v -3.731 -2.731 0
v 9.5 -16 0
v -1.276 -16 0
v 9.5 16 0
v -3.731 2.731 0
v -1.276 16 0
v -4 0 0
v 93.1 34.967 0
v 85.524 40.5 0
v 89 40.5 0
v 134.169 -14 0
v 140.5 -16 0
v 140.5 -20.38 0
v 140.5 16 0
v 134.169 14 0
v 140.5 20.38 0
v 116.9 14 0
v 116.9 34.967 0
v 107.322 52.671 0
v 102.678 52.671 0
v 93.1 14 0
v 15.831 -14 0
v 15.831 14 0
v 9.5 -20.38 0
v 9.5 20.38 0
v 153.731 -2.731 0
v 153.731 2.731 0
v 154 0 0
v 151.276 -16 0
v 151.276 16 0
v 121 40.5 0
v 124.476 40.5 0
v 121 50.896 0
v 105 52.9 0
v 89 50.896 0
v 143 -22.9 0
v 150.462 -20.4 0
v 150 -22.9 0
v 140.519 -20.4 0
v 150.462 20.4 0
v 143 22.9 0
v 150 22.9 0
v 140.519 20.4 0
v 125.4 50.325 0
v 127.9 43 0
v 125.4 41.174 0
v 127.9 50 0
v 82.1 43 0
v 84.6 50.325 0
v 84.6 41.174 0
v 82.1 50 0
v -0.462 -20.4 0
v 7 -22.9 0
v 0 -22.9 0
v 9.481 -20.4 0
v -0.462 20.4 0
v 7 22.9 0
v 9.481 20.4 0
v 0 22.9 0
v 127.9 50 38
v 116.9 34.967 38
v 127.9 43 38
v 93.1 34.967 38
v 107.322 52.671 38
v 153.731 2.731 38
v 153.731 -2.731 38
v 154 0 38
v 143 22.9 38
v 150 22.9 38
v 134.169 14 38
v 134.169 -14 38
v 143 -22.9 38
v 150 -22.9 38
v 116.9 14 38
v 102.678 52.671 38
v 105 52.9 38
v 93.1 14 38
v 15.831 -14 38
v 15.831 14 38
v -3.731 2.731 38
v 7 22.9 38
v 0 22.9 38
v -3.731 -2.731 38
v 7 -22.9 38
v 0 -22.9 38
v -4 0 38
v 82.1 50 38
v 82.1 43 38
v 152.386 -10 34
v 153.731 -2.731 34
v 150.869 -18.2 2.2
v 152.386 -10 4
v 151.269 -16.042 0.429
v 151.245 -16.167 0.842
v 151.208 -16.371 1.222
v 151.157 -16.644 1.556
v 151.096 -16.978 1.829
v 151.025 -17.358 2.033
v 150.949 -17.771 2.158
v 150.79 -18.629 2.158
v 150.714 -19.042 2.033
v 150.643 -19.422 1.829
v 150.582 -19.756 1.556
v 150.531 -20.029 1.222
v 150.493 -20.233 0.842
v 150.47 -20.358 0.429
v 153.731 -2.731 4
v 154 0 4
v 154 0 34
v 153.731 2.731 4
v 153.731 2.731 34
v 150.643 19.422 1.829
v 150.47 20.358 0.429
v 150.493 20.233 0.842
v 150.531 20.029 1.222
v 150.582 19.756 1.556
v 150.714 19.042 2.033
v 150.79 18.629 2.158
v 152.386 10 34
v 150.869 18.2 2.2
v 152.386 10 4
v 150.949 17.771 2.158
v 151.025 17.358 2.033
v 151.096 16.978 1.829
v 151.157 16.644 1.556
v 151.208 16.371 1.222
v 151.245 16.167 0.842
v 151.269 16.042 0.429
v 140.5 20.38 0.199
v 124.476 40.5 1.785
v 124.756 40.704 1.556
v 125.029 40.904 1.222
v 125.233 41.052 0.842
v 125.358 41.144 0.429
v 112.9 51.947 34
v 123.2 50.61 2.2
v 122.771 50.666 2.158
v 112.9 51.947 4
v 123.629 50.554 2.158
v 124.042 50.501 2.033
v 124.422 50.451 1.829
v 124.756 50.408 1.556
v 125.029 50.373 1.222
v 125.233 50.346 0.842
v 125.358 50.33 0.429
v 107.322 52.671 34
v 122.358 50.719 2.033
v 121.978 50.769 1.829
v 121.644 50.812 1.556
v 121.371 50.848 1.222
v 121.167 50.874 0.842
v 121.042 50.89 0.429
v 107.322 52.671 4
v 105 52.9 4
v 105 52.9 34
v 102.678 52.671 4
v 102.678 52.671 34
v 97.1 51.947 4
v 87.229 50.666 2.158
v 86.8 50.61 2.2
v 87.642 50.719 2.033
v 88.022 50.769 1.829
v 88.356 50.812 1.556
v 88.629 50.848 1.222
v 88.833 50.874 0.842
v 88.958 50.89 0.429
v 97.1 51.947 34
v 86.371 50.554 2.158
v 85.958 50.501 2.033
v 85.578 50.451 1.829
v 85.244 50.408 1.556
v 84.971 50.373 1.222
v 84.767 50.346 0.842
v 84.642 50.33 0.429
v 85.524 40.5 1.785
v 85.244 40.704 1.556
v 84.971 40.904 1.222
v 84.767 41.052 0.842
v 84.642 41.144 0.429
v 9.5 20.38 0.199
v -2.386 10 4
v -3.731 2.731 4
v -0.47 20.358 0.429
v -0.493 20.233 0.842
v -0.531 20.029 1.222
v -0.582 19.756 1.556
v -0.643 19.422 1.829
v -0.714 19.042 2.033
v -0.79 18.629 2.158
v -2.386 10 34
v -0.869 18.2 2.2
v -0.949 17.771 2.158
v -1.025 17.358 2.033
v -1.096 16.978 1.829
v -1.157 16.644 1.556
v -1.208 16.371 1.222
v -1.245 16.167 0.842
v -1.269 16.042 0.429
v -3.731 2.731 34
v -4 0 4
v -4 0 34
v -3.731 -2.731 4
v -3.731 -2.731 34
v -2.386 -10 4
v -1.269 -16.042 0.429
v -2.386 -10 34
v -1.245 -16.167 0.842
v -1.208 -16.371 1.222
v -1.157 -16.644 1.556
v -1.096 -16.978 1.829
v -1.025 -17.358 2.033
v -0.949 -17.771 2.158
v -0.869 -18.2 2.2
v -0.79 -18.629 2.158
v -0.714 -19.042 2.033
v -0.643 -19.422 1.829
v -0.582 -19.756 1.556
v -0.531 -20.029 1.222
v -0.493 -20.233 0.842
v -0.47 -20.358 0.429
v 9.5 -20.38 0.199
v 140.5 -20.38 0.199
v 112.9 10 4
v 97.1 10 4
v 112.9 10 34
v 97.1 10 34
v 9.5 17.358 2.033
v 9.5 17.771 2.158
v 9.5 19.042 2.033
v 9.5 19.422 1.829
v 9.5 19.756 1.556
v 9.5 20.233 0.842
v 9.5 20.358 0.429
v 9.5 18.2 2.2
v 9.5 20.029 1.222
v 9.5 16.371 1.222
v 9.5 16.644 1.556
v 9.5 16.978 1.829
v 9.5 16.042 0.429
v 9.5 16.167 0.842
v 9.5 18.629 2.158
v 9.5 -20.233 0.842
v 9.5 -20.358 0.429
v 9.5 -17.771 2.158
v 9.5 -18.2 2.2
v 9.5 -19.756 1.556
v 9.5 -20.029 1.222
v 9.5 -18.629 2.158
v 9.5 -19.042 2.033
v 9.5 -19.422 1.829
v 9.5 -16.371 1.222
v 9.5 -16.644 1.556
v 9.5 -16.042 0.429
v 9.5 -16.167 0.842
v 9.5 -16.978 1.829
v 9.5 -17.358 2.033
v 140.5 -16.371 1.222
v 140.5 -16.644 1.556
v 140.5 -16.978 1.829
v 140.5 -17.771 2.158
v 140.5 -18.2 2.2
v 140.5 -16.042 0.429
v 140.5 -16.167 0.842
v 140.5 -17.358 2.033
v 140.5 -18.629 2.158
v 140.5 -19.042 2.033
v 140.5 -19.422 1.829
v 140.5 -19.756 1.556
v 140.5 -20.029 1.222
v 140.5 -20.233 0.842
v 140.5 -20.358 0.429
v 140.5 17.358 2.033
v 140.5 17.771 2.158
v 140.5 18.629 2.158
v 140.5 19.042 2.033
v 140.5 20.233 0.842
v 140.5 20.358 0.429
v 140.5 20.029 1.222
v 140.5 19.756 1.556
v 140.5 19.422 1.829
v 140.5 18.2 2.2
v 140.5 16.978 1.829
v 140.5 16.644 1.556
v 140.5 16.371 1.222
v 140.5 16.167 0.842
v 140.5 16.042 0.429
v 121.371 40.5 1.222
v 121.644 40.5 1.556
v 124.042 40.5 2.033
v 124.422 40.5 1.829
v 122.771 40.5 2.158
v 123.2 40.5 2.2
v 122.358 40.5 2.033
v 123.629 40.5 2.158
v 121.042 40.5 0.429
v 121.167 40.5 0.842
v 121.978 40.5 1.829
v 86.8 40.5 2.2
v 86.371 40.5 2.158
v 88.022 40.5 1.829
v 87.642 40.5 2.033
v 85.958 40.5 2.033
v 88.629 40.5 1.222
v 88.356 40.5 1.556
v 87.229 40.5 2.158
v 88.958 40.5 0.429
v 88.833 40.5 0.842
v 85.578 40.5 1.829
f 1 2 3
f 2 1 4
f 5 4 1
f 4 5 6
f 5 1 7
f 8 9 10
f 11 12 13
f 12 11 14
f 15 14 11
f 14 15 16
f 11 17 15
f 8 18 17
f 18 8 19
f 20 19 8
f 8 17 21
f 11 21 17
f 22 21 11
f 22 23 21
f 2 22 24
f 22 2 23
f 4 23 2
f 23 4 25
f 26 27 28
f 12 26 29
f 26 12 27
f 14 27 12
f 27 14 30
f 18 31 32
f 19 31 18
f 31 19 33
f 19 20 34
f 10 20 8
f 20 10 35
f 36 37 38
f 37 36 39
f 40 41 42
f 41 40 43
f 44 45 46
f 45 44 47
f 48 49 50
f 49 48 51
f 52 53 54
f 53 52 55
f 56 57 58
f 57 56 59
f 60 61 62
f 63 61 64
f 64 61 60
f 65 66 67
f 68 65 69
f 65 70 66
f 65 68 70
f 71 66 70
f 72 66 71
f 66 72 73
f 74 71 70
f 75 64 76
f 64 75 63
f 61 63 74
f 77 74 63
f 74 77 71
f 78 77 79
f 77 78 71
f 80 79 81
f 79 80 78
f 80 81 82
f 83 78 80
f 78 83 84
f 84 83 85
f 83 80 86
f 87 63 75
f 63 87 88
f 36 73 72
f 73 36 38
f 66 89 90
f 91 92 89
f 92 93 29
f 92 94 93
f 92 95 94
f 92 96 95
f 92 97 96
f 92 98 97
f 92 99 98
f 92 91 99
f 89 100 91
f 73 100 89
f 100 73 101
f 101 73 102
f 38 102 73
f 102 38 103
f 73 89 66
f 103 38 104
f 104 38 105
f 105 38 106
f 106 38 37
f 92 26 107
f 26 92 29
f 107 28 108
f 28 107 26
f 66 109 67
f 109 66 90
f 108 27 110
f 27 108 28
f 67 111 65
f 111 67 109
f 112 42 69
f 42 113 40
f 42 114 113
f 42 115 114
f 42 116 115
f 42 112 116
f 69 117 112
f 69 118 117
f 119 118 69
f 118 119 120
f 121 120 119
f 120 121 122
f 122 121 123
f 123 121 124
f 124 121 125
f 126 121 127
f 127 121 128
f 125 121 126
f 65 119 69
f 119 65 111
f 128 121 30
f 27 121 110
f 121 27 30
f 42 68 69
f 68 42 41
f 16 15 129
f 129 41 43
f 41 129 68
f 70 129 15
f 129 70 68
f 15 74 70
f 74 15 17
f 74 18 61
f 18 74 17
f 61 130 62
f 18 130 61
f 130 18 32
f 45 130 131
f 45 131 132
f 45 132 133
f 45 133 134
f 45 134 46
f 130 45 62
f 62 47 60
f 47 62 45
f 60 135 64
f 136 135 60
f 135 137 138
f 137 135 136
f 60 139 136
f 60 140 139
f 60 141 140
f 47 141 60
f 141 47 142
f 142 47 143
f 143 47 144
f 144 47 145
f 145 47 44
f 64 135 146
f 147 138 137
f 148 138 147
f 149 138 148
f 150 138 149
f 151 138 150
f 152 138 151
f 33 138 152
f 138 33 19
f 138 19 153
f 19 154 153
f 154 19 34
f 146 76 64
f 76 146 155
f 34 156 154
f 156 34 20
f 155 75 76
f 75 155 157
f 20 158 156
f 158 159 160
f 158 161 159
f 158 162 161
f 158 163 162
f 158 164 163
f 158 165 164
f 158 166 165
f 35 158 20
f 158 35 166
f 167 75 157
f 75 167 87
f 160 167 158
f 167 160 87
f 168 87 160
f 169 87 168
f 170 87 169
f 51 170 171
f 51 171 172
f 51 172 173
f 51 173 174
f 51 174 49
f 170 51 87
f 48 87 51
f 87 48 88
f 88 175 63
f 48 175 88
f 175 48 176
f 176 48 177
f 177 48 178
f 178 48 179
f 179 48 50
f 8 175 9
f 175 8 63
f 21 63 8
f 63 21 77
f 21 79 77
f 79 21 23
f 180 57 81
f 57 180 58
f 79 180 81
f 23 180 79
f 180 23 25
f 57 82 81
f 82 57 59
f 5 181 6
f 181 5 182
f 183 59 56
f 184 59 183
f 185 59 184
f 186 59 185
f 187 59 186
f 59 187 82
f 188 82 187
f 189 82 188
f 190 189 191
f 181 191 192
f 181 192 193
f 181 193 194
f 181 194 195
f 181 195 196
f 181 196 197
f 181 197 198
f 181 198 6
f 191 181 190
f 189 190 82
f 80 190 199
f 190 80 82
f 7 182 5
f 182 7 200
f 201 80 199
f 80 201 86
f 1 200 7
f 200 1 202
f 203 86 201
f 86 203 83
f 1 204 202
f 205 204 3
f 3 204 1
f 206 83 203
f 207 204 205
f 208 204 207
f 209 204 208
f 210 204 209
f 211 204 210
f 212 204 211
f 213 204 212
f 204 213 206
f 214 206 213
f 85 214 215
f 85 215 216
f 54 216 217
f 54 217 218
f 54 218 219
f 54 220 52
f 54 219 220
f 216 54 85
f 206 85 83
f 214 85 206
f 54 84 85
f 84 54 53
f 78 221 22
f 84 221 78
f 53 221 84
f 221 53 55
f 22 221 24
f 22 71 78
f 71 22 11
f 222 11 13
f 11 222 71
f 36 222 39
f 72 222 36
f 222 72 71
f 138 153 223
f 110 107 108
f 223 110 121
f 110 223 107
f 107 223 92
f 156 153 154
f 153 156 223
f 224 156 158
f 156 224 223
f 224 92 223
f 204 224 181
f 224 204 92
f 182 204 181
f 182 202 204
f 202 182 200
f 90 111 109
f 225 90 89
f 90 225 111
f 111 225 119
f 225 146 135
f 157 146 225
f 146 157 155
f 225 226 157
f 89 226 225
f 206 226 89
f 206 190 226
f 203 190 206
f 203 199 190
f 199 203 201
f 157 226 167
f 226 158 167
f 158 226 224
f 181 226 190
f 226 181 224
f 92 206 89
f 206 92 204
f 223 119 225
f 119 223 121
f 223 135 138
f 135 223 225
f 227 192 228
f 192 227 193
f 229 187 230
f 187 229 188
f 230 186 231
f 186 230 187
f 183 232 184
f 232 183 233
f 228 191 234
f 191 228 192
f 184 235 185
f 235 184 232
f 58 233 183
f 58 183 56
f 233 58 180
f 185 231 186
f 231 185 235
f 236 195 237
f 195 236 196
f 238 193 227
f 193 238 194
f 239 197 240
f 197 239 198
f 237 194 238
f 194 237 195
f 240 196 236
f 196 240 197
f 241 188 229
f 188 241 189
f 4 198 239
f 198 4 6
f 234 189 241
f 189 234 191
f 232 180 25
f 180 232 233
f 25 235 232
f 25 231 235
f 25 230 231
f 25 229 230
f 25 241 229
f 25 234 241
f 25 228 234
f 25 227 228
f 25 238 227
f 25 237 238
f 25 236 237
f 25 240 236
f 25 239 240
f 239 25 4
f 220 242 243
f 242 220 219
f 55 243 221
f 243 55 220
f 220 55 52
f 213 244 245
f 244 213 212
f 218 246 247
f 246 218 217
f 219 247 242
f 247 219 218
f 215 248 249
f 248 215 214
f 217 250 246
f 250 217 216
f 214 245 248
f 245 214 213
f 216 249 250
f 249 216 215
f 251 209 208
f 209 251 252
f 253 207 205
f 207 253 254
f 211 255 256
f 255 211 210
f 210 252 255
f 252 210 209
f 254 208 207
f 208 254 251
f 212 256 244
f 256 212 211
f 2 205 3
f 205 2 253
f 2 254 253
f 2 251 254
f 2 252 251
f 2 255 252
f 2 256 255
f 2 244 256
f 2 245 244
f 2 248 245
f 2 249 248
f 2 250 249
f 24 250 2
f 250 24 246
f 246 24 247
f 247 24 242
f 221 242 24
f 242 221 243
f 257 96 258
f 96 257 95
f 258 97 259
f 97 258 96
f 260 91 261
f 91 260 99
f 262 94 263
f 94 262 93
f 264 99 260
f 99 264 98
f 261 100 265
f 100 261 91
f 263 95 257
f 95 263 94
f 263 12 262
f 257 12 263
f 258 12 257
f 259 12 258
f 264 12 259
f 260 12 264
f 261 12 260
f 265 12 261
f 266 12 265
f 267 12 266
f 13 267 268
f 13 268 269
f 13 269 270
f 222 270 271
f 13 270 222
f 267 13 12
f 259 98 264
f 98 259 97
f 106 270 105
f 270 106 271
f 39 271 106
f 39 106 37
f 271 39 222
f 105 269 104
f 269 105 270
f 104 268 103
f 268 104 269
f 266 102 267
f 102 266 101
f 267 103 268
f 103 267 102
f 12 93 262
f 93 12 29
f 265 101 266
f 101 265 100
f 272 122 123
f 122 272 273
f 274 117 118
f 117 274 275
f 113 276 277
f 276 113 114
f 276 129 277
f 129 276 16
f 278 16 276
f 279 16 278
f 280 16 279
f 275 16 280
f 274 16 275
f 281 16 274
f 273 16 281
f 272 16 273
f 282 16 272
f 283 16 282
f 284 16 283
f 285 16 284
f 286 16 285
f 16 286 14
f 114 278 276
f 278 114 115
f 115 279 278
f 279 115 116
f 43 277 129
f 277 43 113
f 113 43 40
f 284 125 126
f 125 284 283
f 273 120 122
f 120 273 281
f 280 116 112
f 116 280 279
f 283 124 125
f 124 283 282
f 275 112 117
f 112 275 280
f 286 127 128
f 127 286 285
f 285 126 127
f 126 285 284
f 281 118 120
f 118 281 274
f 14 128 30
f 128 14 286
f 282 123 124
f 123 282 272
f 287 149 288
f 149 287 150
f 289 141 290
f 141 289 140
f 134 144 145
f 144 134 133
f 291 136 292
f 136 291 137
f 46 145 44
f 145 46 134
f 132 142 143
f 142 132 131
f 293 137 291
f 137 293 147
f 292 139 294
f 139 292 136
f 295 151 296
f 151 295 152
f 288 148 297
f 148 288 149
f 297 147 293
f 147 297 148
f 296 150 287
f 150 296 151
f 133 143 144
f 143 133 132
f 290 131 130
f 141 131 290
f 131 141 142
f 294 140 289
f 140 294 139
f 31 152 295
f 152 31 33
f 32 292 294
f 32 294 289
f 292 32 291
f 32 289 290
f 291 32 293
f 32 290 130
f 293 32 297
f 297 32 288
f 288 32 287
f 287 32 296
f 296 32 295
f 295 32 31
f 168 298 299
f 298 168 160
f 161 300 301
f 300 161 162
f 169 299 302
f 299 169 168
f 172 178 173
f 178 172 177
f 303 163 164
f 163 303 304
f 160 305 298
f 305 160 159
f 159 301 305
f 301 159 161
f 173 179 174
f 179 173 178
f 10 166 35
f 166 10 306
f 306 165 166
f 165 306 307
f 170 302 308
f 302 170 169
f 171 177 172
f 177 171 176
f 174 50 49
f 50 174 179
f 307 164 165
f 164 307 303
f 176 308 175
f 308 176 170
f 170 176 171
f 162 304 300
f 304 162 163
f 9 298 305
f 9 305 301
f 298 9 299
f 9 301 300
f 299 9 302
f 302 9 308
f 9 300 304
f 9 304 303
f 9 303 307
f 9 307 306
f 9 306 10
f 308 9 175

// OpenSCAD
$fn = 32;

// ----------------------------------------------------------------------
// Air duct: 28 mm duct, 4 mm wall, 38 mm across
// ----------------------------------------------------------------------

// --- parameters (mm) ---
duct_r = 14;              // duct core radius
duct_d = 28;              // duct core diameter
wall = 4;                 // duct wall thickness
height = 38;              // duct width (extrusion height)
port_r = 22.9;            // port flange half width
port_d = 45.8;            // port flange width
port_t = 7;               // port flange thickness
bolt_d = 4.4;             // port bolt holes
bolt_offset = 18.2;       // bolt hole offset from the port axis
branch_r = 11.9;          // branch core radius
branch_d = 23.8;          // branch core diameter
branch_len = 50;          // branch length from the run axis

difference() {
  /* outer hull chain: tube with a flat flange plate at every port */
  linear_extrude(height = 38) {
    hull() {
      polygon([[0, -22.9], [0, 22.9], [7, 22.9], [7, -22.9]]);
      translate([10, 0]) circle(r = 14);
    }
    hull() {
      translate([10, 0]) circle(r = 14);
      translate([45, 0]) circle(r = 14);
    }
    hull() {
      translate([45, 0]) circle(r = 14);
      translate([105, 0]) circle(r = 14);
    }
    hull() {
      translate([105, 0]) circle(r = 14);
      translate([140, 0]) circle(r = 14);
    }
    hull() {
      translate([140, 0]) circle(r = 14);
      polygon([[150, 22.9], [150, -22.9], [143, -22.9], [143, 22.9]]);
    }
    hull() {
      translate([105, 0]) circle(r = 11.9);
      translate([105, 27.5]) circle(r = 11.9);
    }
    hull() {
      translate([105, 27.5]) circle(r = 11.9);
      translate([105, 41]) circle(r = 11.9);
    }
    hull() {
      translate([105, 41]) circle(r = 11.9);
      polygon([[82.1, 50], [127.9, 50], [127.9, 43], [82.1, 43]]);
    }
  }
  /* air passage: the same chain inset by the wall, 5 mm proud of the ports */
  translate([0, 0, 4]) linear_extrude(height = 30) {
    hull() {
      translate([-5, 0]) circle(r = 10);
      translate([45, 0]) circle(r = 10);
    }
    hull() {
      translate([45, 0]) circle(r = 10);
      translate([105, 0]) circle(r = 10);
    }
    hull() {
      translate([105, 0]) circle(r = 10);
      translate([155, 0]) circle(r = 10);
    }
    hull() {
      translate([105, 0]) circle(r = 7.9);
      translate([105, 27.5]) circle(r = 7.9);
    }
    hull() {
      translate([105, 27.5]) circle(r = 7.9);
      translate([105, 55]) circle(r = 7.9);
    }
  }
  translate([0, 0]) rotate([0, 0, -90]) translate([-18.2, -2.5]) rotate([-90, 0, 0]) cylinder(h = 12, d = 4.4);
  translate([0, 0]) rotate([0, 0, -90]) translate([18.2, -2.5]) rotate([-90, 0, 0]) cylinder(h = 12, d = 4.4);
  translate([150, 0]) rotate([0, 0, 90]) translate([-18.2, -2.5]) rotate([-90, 0, 0]) cylinder(h = 12, d = 4.4);
  translate([150, 0]) rotate([0, 0, 90]) translate([18.2, -2.5]) rotate([-90, 0, 0]) cylinder(h = 12, d = 4.4);
  translate([105, 50]) rotate([0, 0, 180]) translate([-18.2, -2.5]) rotate([-90, 0, 0]) cylinder(h = 12, d = 4.4);
  translate([105, 50]) rotate([0, 0, 180]) translate([18.2, -2.5]) rotate([-90, 0, 0]) cylinder(h = 12, d = 4.4);
}
